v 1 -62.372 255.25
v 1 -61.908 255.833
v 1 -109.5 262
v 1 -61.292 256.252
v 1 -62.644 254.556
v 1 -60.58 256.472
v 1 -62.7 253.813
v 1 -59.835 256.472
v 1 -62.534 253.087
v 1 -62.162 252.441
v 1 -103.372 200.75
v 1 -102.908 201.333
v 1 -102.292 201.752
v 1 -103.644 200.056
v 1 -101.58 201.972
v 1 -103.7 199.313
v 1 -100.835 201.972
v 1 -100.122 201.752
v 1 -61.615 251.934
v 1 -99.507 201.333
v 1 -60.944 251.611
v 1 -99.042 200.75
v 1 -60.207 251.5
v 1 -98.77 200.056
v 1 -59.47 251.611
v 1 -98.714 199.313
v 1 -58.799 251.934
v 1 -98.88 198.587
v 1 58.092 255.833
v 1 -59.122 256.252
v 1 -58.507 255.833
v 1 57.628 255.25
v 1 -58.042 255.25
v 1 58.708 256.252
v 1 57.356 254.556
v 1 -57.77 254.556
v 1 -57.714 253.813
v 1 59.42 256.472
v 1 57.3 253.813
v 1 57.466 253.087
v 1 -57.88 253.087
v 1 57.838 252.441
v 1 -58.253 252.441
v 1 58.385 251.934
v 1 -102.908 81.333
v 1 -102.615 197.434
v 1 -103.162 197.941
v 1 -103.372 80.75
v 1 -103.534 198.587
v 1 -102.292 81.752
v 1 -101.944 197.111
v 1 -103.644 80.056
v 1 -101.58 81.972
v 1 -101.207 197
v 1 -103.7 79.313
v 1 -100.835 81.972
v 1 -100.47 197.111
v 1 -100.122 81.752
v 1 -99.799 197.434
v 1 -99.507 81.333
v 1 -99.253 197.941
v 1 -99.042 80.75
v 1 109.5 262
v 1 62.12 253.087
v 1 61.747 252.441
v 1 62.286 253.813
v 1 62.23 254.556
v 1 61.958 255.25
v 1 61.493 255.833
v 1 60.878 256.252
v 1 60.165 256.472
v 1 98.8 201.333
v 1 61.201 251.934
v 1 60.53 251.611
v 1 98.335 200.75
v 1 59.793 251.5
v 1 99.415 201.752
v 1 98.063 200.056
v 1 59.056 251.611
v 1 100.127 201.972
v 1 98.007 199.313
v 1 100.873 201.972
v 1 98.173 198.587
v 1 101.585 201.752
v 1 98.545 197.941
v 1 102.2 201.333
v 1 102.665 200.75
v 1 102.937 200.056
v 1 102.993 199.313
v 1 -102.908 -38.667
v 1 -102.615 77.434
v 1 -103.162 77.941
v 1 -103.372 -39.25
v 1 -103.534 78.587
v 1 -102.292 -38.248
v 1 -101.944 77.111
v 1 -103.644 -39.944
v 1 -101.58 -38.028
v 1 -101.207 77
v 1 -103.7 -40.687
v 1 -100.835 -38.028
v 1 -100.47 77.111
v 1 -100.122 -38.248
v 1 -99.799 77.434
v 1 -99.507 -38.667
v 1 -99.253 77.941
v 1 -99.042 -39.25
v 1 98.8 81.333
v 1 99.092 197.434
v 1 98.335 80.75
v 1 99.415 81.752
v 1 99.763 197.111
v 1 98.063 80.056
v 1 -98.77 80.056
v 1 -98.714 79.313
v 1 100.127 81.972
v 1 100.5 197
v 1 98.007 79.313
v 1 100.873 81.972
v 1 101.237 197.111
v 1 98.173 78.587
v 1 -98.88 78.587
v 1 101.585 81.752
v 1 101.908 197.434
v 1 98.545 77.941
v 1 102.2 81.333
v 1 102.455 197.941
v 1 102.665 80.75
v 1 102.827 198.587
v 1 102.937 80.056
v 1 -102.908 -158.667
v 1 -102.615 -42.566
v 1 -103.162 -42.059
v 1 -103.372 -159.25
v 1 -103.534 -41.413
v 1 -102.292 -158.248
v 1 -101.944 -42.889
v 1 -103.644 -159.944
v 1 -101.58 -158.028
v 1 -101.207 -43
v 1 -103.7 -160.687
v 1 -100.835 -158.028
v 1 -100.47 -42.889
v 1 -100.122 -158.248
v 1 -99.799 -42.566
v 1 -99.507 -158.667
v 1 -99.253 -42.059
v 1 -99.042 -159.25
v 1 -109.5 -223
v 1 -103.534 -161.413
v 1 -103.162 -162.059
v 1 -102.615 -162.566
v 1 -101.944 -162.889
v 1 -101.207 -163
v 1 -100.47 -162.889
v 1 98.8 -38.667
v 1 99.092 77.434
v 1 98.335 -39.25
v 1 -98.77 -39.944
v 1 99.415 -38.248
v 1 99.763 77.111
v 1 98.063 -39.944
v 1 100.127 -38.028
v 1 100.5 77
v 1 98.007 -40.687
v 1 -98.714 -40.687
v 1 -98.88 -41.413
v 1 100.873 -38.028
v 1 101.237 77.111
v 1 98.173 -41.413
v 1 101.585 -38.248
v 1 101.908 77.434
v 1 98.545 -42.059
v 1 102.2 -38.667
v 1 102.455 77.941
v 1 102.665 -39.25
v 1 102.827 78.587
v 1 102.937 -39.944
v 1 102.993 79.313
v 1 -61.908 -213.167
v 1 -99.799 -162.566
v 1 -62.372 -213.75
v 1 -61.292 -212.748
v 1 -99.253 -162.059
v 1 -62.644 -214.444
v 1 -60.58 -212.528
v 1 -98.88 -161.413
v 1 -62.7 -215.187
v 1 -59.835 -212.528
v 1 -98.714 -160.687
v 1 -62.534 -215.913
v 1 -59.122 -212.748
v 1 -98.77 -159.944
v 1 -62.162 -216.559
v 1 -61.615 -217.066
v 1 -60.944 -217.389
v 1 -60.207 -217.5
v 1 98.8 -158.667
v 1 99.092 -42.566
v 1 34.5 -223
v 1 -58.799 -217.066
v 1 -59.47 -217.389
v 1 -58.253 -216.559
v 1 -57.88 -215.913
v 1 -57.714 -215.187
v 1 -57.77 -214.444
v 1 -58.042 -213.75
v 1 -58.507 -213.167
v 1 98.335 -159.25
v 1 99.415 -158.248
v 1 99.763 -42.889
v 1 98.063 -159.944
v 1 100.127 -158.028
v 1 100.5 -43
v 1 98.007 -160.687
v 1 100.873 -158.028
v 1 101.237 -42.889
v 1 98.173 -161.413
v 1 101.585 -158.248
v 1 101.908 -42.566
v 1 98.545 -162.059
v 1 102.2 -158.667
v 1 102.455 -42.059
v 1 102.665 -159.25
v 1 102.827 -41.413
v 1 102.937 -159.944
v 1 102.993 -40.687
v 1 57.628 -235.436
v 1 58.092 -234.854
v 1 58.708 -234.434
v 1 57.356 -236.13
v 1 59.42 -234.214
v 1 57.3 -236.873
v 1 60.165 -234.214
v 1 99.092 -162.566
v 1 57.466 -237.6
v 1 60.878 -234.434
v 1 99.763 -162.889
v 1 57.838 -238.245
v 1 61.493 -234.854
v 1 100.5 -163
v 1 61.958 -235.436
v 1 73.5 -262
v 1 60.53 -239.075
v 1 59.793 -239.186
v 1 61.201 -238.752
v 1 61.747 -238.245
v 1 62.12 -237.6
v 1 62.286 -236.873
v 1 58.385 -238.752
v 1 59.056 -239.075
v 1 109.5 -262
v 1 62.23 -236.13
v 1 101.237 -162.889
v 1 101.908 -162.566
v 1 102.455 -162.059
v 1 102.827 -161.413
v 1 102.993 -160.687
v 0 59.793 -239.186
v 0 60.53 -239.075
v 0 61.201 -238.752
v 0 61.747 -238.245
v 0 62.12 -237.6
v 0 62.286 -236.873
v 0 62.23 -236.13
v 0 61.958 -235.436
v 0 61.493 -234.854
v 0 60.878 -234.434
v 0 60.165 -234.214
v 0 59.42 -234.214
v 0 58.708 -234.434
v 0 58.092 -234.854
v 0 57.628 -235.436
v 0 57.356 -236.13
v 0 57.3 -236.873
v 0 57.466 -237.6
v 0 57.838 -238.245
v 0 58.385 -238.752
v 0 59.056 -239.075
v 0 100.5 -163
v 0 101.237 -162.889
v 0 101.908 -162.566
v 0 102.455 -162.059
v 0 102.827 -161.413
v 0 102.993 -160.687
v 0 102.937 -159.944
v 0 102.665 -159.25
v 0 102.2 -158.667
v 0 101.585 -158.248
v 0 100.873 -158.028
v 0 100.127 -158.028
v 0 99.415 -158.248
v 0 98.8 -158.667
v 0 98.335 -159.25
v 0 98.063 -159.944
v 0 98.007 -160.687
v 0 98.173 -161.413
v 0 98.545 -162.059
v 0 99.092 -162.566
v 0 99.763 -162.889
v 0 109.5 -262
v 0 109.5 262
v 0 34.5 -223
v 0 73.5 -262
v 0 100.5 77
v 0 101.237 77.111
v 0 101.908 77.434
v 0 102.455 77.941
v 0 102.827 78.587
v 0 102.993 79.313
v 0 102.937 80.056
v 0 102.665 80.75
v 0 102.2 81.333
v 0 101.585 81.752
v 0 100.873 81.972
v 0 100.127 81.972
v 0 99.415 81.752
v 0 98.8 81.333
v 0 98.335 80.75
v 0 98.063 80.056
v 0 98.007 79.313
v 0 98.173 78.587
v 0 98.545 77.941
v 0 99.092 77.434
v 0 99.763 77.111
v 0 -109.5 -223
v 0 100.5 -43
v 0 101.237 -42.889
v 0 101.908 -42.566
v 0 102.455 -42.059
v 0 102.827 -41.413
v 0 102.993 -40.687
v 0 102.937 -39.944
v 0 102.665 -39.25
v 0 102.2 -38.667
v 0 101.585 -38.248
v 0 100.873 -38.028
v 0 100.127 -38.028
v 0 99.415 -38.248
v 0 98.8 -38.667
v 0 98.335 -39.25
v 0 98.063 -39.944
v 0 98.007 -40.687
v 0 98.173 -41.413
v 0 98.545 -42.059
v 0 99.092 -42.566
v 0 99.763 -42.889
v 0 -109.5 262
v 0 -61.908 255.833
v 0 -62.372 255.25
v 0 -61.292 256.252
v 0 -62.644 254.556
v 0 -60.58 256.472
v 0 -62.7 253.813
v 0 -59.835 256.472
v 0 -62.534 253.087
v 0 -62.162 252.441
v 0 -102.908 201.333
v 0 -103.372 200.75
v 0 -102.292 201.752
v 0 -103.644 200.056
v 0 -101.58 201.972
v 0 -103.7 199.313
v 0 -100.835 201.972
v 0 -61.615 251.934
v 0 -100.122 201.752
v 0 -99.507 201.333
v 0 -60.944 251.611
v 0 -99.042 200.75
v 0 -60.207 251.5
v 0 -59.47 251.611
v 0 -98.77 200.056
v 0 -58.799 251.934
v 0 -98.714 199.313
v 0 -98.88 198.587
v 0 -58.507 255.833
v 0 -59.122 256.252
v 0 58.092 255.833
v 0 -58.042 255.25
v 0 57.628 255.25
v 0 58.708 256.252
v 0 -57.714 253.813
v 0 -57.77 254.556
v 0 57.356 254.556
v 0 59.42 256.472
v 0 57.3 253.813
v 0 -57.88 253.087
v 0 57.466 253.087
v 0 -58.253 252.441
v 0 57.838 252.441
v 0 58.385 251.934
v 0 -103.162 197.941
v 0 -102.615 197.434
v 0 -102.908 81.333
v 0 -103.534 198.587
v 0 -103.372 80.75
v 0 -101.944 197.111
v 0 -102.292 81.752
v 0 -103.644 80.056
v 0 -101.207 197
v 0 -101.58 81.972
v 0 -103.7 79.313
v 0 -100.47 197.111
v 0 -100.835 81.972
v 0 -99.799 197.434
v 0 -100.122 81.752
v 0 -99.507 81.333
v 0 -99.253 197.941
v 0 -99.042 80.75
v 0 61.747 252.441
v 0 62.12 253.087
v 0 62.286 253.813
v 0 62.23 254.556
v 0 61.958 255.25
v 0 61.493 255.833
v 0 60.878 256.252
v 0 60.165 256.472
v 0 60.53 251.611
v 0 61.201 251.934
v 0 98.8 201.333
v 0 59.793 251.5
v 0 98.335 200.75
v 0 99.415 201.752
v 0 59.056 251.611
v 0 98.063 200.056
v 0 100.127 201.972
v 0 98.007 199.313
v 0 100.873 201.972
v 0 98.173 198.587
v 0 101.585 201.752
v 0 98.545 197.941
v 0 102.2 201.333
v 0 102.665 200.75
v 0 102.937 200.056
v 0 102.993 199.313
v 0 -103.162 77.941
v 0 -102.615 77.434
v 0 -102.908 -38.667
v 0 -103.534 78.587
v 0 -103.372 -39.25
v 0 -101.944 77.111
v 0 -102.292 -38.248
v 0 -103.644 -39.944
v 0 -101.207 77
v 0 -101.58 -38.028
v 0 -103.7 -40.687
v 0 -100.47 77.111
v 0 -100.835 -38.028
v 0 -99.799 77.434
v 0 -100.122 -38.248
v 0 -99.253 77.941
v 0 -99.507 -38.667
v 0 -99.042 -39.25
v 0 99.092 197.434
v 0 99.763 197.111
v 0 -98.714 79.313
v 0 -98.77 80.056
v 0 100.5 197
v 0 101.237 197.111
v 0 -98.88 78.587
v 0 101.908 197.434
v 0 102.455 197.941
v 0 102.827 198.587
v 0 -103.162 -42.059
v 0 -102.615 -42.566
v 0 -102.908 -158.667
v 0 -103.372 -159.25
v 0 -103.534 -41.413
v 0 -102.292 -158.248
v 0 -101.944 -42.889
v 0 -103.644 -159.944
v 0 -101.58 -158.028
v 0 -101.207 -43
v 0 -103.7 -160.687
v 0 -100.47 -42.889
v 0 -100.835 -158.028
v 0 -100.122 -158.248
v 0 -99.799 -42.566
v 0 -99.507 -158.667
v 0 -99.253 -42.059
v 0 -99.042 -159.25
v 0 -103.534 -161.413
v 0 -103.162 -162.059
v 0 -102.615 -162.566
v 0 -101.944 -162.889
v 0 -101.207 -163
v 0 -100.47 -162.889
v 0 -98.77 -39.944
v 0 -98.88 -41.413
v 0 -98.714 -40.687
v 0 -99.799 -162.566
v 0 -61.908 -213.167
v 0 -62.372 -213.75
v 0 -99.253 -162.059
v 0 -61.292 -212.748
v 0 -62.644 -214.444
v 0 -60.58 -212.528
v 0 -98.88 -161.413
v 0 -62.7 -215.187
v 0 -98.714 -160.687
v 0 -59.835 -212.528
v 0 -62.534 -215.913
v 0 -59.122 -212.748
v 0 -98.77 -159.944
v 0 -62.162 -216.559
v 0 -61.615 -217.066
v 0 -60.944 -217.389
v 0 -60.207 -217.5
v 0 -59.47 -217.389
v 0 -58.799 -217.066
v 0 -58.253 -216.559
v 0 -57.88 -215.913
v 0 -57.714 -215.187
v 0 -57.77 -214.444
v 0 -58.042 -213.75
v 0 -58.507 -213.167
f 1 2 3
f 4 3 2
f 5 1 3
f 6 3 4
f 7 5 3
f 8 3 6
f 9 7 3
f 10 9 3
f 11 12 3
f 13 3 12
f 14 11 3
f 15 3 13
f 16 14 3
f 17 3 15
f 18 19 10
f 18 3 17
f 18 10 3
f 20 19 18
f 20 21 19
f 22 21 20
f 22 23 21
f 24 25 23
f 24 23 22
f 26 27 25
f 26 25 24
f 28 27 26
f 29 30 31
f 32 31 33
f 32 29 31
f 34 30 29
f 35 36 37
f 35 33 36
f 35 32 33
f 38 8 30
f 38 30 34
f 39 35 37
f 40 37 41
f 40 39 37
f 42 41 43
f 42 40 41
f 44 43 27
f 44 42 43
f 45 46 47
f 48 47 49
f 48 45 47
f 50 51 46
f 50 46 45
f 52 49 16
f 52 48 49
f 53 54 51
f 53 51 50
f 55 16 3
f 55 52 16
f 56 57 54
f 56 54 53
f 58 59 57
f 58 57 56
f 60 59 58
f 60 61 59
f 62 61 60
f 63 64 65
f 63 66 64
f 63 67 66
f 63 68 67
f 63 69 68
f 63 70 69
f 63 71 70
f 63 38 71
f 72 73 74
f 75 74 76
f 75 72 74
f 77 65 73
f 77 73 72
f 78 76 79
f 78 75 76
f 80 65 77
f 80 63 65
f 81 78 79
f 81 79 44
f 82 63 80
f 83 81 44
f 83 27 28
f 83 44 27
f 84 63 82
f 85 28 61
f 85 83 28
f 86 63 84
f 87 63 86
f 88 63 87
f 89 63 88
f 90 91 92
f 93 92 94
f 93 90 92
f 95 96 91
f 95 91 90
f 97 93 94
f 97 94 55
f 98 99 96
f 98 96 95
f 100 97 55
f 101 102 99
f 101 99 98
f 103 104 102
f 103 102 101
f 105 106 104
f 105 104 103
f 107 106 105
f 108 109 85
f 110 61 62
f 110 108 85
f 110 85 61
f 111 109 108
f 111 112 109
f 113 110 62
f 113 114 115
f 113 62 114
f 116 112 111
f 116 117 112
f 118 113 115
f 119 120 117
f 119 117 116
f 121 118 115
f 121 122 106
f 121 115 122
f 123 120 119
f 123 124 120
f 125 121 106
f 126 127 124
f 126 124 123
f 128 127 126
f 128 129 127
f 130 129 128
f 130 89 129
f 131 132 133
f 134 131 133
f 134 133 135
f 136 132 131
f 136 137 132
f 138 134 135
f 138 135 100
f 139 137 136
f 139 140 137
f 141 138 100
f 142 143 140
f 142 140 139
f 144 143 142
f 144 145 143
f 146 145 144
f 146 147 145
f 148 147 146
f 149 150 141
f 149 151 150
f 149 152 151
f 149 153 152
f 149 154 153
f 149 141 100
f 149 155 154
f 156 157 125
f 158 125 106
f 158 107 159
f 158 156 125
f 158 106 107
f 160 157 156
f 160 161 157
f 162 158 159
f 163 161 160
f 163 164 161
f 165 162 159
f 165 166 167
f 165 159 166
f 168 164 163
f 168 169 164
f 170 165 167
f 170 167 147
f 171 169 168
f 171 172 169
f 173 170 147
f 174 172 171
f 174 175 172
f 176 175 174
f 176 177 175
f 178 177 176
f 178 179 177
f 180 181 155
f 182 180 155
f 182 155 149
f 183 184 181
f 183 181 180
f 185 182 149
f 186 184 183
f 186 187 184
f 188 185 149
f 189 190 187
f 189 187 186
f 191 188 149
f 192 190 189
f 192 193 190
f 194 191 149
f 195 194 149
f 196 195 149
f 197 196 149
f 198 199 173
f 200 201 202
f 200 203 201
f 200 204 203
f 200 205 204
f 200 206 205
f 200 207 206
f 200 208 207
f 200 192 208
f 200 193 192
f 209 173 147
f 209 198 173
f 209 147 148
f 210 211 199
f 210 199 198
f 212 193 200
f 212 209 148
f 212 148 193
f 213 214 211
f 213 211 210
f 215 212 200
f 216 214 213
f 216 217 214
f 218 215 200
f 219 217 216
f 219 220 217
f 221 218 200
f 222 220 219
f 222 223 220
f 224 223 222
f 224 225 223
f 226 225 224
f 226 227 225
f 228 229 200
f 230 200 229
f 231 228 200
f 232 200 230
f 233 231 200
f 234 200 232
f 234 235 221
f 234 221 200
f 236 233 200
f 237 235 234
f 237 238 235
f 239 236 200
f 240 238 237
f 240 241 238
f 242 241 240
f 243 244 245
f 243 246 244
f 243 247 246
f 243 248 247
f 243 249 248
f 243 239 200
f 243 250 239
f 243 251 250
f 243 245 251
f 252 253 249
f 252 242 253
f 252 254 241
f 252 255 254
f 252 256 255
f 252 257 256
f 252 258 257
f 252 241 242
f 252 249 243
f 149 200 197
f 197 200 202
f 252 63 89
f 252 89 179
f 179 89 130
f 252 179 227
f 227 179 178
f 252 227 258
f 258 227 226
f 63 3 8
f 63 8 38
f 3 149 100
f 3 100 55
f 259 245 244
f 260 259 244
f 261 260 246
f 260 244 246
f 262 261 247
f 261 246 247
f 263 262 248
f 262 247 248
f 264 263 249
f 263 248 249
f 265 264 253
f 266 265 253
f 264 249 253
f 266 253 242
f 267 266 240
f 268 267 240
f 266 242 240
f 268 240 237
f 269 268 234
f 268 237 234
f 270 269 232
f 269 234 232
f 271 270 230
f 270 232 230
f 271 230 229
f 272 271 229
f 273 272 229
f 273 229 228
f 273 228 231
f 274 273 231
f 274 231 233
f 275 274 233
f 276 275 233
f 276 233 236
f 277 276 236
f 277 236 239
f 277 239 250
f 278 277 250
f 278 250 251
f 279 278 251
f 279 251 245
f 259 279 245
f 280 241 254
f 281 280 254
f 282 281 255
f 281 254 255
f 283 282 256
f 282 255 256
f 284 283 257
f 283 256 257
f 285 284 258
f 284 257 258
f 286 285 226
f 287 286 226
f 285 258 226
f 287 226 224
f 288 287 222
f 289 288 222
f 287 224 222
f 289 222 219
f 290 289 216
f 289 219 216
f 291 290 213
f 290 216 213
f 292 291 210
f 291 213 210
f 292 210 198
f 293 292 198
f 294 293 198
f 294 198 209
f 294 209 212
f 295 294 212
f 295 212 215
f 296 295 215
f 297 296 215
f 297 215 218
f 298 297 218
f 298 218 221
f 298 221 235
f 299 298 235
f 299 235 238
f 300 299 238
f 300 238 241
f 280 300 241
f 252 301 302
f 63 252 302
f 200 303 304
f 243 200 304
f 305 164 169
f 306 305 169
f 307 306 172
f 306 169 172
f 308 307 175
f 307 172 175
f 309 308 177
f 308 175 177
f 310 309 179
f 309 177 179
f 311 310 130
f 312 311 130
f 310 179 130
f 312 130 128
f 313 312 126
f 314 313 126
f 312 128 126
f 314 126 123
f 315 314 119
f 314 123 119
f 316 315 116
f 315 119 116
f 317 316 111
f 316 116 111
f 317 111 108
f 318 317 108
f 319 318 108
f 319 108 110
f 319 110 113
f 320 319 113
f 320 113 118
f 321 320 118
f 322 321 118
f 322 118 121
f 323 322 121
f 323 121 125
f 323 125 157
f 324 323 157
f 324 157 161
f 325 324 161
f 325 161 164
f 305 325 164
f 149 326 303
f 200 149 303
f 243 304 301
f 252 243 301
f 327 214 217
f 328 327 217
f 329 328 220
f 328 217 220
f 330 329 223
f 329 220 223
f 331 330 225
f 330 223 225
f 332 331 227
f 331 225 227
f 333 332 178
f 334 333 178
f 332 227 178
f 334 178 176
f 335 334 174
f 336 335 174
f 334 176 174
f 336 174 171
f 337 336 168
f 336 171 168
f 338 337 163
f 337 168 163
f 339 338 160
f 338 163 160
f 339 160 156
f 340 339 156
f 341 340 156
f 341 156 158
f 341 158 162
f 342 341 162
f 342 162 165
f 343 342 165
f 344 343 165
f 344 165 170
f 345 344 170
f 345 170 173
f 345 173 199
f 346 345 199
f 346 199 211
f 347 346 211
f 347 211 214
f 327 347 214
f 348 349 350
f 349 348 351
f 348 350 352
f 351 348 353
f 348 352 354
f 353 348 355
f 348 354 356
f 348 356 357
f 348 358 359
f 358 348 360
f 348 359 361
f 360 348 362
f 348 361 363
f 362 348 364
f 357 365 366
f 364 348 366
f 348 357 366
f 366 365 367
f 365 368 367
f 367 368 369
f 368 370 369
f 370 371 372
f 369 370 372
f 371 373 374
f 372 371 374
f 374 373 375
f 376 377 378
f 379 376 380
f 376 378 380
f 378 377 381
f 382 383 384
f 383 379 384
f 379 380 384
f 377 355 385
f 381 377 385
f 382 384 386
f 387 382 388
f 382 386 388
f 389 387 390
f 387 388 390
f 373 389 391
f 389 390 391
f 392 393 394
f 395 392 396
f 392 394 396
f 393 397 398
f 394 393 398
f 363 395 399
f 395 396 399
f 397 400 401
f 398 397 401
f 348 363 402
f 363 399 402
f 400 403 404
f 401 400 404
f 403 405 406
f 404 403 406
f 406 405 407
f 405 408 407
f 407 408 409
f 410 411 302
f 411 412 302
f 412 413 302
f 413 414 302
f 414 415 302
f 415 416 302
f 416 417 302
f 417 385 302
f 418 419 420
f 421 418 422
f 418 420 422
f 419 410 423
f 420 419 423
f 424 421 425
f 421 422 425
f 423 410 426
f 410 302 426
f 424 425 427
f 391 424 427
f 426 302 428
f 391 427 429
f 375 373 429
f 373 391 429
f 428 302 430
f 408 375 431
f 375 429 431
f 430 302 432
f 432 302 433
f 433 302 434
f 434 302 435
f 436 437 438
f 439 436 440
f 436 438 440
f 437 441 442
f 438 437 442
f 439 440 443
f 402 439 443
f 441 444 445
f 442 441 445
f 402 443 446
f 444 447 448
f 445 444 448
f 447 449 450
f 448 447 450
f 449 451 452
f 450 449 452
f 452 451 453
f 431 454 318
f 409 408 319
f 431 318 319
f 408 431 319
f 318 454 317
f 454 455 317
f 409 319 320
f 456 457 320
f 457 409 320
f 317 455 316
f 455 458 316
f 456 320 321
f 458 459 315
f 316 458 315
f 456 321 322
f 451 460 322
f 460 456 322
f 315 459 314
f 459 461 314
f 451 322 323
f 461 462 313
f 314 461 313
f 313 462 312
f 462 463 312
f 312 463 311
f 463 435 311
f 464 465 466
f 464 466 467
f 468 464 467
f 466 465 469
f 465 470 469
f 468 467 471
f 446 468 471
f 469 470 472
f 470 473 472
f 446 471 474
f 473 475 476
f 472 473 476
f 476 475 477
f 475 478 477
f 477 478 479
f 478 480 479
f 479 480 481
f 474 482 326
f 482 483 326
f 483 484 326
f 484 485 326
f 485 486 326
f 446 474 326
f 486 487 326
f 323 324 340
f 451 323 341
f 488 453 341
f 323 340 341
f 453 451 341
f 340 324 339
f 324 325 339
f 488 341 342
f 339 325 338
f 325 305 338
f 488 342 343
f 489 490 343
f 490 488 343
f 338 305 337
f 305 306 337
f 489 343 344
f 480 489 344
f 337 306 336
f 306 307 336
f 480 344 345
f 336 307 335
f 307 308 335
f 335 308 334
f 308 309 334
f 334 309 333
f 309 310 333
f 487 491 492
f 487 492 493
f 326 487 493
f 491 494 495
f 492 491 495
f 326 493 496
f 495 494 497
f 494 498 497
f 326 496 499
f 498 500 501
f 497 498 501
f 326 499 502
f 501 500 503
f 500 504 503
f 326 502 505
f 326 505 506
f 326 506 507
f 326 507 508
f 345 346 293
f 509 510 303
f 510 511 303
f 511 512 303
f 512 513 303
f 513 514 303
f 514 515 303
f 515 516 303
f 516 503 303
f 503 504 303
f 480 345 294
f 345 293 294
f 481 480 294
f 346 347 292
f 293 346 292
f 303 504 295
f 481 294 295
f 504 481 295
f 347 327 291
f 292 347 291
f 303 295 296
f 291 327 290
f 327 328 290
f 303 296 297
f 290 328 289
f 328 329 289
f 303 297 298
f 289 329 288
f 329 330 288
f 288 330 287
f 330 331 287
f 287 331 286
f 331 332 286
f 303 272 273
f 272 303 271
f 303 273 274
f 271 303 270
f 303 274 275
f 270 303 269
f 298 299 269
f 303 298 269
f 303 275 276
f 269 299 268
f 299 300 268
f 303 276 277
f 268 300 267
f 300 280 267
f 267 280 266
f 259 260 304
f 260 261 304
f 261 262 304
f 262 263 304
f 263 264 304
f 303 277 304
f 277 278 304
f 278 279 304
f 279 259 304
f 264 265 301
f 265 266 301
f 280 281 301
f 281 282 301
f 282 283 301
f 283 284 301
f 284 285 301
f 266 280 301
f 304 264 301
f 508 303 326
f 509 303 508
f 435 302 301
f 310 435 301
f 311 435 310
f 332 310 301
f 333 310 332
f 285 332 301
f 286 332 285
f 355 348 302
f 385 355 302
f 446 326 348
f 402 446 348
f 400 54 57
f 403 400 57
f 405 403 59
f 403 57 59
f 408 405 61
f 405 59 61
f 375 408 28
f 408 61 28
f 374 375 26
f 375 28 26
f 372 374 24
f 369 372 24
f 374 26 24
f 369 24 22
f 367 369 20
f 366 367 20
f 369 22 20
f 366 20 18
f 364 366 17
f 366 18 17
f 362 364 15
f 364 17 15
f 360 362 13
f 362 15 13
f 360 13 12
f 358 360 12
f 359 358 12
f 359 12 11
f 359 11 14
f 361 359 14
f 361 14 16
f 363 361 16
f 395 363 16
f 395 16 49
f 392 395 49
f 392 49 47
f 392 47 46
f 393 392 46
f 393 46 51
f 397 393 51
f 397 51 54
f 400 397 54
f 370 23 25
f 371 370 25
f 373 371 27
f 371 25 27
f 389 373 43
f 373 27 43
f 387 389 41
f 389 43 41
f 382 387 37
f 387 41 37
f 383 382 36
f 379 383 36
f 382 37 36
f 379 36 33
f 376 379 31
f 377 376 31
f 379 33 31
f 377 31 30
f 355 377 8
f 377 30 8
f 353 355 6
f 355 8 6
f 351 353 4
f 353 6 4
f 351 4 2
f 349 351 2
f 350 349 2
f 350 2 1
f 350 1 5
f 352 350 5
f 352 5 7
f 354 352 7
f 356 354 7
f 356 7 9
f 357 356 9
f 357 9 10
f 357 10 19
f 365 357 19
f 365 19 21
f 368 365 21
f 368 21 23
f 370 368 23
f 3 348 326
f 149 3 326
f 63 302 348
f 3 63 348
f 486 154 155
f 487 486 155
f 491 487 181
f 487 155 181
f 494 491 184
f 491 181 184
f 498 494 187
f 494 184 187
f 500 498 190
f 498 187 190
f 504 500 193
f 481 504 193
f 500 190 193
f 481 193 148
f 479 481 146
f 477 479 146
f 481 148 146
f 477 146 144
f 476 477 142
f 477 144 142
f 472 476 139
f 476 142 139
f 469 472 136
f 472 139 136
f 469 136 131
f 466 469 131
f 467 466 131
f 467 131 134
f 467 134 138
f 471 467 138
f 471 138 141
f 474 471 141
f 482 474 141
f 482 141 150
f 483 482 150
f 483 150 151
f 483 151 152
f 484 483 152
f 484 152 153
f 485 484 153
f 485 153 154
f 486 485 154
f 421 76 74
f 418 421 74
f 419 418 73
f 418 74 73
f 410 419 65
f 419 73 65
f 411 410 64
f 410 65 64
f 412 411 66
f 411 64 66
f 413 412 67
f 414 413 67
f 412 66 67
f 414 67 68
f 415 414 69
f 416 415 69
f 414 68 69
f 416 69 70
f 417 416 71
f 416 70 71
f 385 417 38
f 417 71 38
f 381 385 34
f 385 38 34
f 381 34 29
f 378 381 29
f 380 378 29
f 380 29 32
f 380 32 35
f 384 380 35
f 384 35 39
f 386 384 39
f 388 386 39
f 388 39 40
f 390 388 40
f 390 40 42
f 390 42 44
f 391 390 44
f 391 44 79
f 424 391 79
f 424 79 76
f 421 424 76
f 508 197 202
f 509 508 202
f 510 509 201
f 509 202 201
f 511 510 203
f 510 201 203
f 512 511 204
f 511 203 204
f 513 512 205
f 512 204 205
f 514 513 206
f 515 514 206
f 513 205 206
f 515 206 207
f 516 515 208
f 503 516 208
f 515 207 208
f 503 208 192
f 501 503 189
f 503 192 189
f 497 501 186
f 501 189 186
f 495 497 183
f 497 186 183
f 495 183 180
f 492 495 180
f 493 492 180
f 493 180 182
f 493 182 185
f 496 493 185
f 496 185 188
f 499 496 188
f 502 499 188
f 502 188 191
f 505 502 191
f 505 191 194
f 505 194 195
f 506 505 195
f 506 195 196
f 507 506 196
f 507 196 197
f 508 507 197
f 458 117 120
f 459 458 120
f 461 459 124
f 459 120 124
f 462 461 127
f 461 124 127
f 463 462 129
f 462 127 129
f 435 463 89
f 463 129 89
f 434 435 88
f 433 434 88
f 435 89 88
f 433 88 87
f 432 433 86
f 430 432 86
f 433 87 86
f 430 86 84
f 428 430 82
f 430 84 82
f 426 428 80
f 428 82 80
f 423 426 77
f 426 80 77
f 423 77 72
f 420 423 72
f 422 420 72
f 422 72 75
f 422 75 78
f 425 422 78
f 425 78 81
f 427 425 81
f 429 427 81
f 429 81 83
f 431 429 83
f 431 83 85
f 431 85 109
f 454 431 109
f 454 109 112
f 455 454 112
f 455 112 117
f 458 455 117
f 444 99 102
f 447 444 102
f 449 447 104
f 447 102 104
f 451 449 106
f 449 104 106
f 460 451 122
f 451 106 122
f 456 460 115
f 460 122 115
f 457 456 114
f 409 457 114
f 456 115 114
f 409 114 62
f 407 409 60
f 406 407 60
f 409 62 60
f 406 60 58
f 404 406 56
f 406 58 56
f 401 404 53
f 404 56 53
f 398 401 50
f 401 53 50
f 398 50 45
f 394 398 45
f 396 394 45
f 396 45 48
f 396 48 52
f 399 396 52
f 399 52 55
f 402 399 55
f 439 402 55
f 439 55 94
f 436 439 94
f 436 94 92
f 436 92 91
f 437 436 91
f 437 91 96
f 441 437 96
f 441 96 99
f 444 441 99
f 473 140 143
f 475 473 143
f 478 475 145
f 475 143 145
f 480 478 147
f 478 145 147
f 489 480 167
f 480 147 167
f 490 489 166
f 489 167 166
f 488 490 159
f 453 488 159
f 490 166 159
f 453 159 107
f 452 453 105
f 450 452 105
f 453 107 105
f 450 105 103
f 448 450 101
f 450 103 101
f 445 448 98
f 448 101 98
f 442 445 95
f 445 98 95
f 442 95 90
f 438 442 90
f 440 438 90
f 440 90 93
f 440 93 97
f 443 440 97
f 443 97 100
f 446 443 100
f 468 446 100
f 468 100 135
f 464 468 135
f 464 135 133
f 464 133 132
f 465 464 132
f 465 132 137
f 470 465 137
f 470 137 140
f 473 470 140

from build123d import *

# Parameters (mm, degrees)
EXTRUDE_1_DEPTH     = 1
CUT_EXTRUDE_1_REACH = 285.963
SKETCH_2_R          = 2.5


with BuildPart() as part:
    # Эскиз1 → Бобышка-Вытянуть1 (new body)
    with BuildSketch(Plane(origin=(0, 0, 0), x_dir=(0, 0, -1), z_dir=(1, 0, 0))):
        Polygon((223, -109.5), (223, 34.5), (262, 73.5), (262, 109.5), (-262, 109.5), (-262, -109.5), align=None)
    extrude(amount=EXTRUDE_1_DEPTH)

    # Эскиз2 → Вырез-Вытянуть1 (cut, up to next)
    with BuildSketch(Plane(origin=(1, 0, 0), x_dir=(0, 0, -1), z_dir=(1, 0, 0)), mode=Mode.PRIVATE) as cut_extrude_1_sk1:
        with Locations((40.5, -101.207106781)):
            Circle(SKETCH_2_R)
    cut_extrude_1_tool1 = extrude(cut_extrude_1_sk1.sketch, amount=-CUT_EXTRUDE_1_REACH, mode=Mode.PRIVATE) & part.part
    # Эскиз2 → Вырез-Вытянуть1 (cut, up to next)
    with BuildSketch(Plane(origin=(1, 0, 0), x_dir=(0, 0, -1), z_dir=(1, 0, 0)), mode=Mode.PRIVATE) as cut_extrude_1_sk2:
        with Locations((160.5, -101.207106781)):
            Circle(SKETCH_2_R)
    cut_extrude_1_tool2 = extrude(cut_extrude_1_sk2.sketch, amount=-CUT_EXTRUDE_1_REACH, mode=Mode.PRIVATE) & part.part
    # Эскиз2 → Вырез-Вытянуть1 (cut, up to next)
    with BuildSketch(Plane(origin=(1, 0, 0), x_dir=(0, 0, -1), z_dir=(1, 0, 0)), mode=Mode.PRIVATE) as cut_extrude_1_sk3:
        with Locations((-79.5, -101.207106781)):
            Circle(SKETCH_2_R)
    cut_extrude_1_tool3 = extrude(cut_extrude_1_sk3.sketch, amount=-CUT_EXTRUDE_1_REACH, mode=Mode.PRIVATE) & part.part
    # Эскиз2 → Вырез-Вытянуть1 (cut, up to next)
    with BuildSketch(Plane(origin=(1, 0, 0), x_dir=(0, 0, -1), z_dir=(1, 0, 0)), mode=Mode.PRIVATE) as cut_extrude_1_sk4:
        with Locations((-199.5, -101.207106781)):
            Circle(SKETCH_2_R)
    cut_extrude_1_tool4 = extrude(cut_extrude_1_sk4.sketch, amount=-CUT_EXTRUDE_1_REACH, mode=Mode.PRIVATE) & part.part
    # Эскиз2 → Вырез-Вытянуть1 (cut, up to next)
    with BuildSketch(Plane(origin=(1, 0, 0), x_dir=(0, 0, -1), z_dir=(1, 0, 0)), mode=Mode.PRIVATE) as cut_extrude_1_sk5:
        with Locations((215, -60.207106781)):
            Circle(SKETCH_2_R)
    cut_extrude_1_tool5 = extrude(cut_extrude_1_sk5.sketch, amount=-CUT_EXTRUDE_1_REACH, mode=Mode.PRIVATE) & part.part
    # Эскиз2 → Вырез-Вытянуть1 (cut, up to next)
    with BuildSketch(Plane(origin=(1, 0, 0), x_dir=(0, 0, -1), z_dir=(1, 0, 0)), mode=Mode.PRIVATE) as cut_extrude_1_sk6:
        with Locations((236.686291501, 59.792893219)):
            Circle(SKETCH_2_R)
    cut_extrude_1_tool6 = extrude(cut_extrude_1_sk6.sketch, amount=-CUT_EXTRUDE_1_REACH, mode=Mode.PRIVATE) & part.part
    # Эскиз2 → Вырез-Вытянуть1 (cut, up to next)
    with BuildSketch(Plane(origin=(1, 0, 0), x_dir=(0, 0, -1), z_dir=(1, 0, 0)), mode=Mode.PRIVATE) as cut_extrude_1_sk7:
        with Locations((-254, 59.792893219)):
            Circle(SKETCH_2_R)
    cut_extrude_1_tool7 = extrude(cut_extrude_1_sk7.sketch, amount=-CUT_EXTRUDE_1_REACH, mode=Mode.PRIVATE) & part.part
    # Эскиз2 → Вырез-Вытянуть1 (cut, up to next)
    with BuildSketch(Plane(origin=(1, 0, 0), x_dir=(0, 0, -1), z_dir=(1, 0, 0)), mode=Mode.PRIVATE) as cut_extrude_1_sk8:
        with Locations((-254, -60.207106781)):
            Circle(SKETCH_2_R)
    cut_extrude_1_tool8 = extrude(cut_extrude_1_sk8.sketch, amount=-CUT_EXTRUDE_1_REACH, mode=Mode.PRIVATE) & part.part
    # Эскиз2 → Вырез-Вытянуть1 (cut, up to next)
    with BuildSketch(Plane(origin=(1, 0, 0), x_dir=(0, 0, -1), z_dir=(1, 0, 0)), mode=Mode.PRIVATE) as cut_extrude_1_sk9:
        with Locations((-199.5, 100.5)):
            Circle(SKETCH_2_R)
    cut_extrude_1_tool9 = extrude(cut_extrude_1_sk9.sketch, amount=-CUT_EXTRUDE_1_REACH, mode=Mode.PRIVATE) & part.part
    # Эскиз2 → Вырез-Вытянуть1 (cut, up to next)
    with BuildSketch(Plane(origin=(1, 0, 0), x_dir=(0, 0, -1), z_dir=(1, 0, 0)), mode=Mode.PRIVATE) as cut_extrude_1_sk10:
        with Locations((-79.5, 100.5)):
            Circle(SKETCH_2_R)
    cut_extrude_1_tool10 = extrude(cut_extrude_1_sk10.sketch, amount=-CUT_EXTRUDE_1_REACH, mode=Mode.PRIVATE) & part.part
    # Эскиз2 → Вырез-Вытянуть1 (cut, up to next)
    with BuildSketch(Plane(origin=(1, 0, 0), x_dir=(0, 0, -1), z_dir=(1, 0, 0)), mode=Mode.PRIVATE) as cut_extrude_1_sk11:
        with Locations((40.5, 100.5)):
            Circle(SKETCH_2_R)
    cut_extrude_1_tool11 = extrude(cut_extrude_1_sk11.sketch, amount=-CUT_EXTRUDE_1_REACH, mode=Mode.PRIVATE) & part.part
    # Эскиз2 → Вырез-Вытянуть1 (cut, up to next)
    with BuildSketch(Plane(origin=(1, 0, 0), x_dir=(0, 0, -1), z_dir=(1, 0, 0)), mode=Mode.PRIVATE) as cut_extrude_1_sk12:
        with Locations((160.5, 100.5)):
            Circle(SKETCH_2_R)
    cut_extrude_1_tool12 = extrude(cut_extrude_1_sk12.sketch, amount=-CUT_EXTRUDE_1_REACH, mode=Mode.PRIVATE) & part.part
    add(cut_extrude_1_tool1.solids().sort_by_distance((1, -101.207107, -40.5))[0], mode=Mode.SUBTRACT)
    add(cut_extrude_1_tool2.solids().sort_by_distance((1, -101.207107, -160.5))[0], mode=Mode.SUBTRACT)
    add(cut_extrude_1_tool3.solids().sort_by_distance((1, -101.207107, 79.5))[0], mode=Mode.SUBTRACT)
    add(cut_extrude_1_tool4.solids().sort_by_distance((1, -101.207107, 199.5))[0], mode=Mode.SUBTRACT)
    add(cut_extrude_1_tool5.solids().sort_by_distance((1, -60.207107, -215))[0], mode=Mode.SUBTRACT)
    add(cut_extrude_1_tool6.solids().sort_by_distance((1, 59.792893, -236.686292))[0], mode=Mode.SUBTRACT)
    add(cut_extrude_1_tool7.solids().sort_by_distance((1, 59.792893, 254))[0], mode=Mode.SUBTRACT)
    add(cut_extrude_1_tool8.solids().sort_by_distance((1, -60.207107, 254))[0], mode=Mode.SUBTRACT)
    add(cut_extrude_1_tool9.solids().sort_by_distance((1, 100.5, 199.5))[0], mode=Mode.SUBTRACT)
    add(cut_extrude_1_tool10.solids().sort_by_distance((1, 100.5, 79.5))[0], mode=Mode.SUBTRACT)
    add(cut_extrude_1_tool11.solids().sort_by_distance((1, 100.5, -40.5))[0], mode=Mode.SUBTRACT)
    add(cut_extrude_1_tool12.solids().sort_by_distance((1, 100.5, -160.5))[0], mode=Mode.SUBTRACT)


solid = part.part
